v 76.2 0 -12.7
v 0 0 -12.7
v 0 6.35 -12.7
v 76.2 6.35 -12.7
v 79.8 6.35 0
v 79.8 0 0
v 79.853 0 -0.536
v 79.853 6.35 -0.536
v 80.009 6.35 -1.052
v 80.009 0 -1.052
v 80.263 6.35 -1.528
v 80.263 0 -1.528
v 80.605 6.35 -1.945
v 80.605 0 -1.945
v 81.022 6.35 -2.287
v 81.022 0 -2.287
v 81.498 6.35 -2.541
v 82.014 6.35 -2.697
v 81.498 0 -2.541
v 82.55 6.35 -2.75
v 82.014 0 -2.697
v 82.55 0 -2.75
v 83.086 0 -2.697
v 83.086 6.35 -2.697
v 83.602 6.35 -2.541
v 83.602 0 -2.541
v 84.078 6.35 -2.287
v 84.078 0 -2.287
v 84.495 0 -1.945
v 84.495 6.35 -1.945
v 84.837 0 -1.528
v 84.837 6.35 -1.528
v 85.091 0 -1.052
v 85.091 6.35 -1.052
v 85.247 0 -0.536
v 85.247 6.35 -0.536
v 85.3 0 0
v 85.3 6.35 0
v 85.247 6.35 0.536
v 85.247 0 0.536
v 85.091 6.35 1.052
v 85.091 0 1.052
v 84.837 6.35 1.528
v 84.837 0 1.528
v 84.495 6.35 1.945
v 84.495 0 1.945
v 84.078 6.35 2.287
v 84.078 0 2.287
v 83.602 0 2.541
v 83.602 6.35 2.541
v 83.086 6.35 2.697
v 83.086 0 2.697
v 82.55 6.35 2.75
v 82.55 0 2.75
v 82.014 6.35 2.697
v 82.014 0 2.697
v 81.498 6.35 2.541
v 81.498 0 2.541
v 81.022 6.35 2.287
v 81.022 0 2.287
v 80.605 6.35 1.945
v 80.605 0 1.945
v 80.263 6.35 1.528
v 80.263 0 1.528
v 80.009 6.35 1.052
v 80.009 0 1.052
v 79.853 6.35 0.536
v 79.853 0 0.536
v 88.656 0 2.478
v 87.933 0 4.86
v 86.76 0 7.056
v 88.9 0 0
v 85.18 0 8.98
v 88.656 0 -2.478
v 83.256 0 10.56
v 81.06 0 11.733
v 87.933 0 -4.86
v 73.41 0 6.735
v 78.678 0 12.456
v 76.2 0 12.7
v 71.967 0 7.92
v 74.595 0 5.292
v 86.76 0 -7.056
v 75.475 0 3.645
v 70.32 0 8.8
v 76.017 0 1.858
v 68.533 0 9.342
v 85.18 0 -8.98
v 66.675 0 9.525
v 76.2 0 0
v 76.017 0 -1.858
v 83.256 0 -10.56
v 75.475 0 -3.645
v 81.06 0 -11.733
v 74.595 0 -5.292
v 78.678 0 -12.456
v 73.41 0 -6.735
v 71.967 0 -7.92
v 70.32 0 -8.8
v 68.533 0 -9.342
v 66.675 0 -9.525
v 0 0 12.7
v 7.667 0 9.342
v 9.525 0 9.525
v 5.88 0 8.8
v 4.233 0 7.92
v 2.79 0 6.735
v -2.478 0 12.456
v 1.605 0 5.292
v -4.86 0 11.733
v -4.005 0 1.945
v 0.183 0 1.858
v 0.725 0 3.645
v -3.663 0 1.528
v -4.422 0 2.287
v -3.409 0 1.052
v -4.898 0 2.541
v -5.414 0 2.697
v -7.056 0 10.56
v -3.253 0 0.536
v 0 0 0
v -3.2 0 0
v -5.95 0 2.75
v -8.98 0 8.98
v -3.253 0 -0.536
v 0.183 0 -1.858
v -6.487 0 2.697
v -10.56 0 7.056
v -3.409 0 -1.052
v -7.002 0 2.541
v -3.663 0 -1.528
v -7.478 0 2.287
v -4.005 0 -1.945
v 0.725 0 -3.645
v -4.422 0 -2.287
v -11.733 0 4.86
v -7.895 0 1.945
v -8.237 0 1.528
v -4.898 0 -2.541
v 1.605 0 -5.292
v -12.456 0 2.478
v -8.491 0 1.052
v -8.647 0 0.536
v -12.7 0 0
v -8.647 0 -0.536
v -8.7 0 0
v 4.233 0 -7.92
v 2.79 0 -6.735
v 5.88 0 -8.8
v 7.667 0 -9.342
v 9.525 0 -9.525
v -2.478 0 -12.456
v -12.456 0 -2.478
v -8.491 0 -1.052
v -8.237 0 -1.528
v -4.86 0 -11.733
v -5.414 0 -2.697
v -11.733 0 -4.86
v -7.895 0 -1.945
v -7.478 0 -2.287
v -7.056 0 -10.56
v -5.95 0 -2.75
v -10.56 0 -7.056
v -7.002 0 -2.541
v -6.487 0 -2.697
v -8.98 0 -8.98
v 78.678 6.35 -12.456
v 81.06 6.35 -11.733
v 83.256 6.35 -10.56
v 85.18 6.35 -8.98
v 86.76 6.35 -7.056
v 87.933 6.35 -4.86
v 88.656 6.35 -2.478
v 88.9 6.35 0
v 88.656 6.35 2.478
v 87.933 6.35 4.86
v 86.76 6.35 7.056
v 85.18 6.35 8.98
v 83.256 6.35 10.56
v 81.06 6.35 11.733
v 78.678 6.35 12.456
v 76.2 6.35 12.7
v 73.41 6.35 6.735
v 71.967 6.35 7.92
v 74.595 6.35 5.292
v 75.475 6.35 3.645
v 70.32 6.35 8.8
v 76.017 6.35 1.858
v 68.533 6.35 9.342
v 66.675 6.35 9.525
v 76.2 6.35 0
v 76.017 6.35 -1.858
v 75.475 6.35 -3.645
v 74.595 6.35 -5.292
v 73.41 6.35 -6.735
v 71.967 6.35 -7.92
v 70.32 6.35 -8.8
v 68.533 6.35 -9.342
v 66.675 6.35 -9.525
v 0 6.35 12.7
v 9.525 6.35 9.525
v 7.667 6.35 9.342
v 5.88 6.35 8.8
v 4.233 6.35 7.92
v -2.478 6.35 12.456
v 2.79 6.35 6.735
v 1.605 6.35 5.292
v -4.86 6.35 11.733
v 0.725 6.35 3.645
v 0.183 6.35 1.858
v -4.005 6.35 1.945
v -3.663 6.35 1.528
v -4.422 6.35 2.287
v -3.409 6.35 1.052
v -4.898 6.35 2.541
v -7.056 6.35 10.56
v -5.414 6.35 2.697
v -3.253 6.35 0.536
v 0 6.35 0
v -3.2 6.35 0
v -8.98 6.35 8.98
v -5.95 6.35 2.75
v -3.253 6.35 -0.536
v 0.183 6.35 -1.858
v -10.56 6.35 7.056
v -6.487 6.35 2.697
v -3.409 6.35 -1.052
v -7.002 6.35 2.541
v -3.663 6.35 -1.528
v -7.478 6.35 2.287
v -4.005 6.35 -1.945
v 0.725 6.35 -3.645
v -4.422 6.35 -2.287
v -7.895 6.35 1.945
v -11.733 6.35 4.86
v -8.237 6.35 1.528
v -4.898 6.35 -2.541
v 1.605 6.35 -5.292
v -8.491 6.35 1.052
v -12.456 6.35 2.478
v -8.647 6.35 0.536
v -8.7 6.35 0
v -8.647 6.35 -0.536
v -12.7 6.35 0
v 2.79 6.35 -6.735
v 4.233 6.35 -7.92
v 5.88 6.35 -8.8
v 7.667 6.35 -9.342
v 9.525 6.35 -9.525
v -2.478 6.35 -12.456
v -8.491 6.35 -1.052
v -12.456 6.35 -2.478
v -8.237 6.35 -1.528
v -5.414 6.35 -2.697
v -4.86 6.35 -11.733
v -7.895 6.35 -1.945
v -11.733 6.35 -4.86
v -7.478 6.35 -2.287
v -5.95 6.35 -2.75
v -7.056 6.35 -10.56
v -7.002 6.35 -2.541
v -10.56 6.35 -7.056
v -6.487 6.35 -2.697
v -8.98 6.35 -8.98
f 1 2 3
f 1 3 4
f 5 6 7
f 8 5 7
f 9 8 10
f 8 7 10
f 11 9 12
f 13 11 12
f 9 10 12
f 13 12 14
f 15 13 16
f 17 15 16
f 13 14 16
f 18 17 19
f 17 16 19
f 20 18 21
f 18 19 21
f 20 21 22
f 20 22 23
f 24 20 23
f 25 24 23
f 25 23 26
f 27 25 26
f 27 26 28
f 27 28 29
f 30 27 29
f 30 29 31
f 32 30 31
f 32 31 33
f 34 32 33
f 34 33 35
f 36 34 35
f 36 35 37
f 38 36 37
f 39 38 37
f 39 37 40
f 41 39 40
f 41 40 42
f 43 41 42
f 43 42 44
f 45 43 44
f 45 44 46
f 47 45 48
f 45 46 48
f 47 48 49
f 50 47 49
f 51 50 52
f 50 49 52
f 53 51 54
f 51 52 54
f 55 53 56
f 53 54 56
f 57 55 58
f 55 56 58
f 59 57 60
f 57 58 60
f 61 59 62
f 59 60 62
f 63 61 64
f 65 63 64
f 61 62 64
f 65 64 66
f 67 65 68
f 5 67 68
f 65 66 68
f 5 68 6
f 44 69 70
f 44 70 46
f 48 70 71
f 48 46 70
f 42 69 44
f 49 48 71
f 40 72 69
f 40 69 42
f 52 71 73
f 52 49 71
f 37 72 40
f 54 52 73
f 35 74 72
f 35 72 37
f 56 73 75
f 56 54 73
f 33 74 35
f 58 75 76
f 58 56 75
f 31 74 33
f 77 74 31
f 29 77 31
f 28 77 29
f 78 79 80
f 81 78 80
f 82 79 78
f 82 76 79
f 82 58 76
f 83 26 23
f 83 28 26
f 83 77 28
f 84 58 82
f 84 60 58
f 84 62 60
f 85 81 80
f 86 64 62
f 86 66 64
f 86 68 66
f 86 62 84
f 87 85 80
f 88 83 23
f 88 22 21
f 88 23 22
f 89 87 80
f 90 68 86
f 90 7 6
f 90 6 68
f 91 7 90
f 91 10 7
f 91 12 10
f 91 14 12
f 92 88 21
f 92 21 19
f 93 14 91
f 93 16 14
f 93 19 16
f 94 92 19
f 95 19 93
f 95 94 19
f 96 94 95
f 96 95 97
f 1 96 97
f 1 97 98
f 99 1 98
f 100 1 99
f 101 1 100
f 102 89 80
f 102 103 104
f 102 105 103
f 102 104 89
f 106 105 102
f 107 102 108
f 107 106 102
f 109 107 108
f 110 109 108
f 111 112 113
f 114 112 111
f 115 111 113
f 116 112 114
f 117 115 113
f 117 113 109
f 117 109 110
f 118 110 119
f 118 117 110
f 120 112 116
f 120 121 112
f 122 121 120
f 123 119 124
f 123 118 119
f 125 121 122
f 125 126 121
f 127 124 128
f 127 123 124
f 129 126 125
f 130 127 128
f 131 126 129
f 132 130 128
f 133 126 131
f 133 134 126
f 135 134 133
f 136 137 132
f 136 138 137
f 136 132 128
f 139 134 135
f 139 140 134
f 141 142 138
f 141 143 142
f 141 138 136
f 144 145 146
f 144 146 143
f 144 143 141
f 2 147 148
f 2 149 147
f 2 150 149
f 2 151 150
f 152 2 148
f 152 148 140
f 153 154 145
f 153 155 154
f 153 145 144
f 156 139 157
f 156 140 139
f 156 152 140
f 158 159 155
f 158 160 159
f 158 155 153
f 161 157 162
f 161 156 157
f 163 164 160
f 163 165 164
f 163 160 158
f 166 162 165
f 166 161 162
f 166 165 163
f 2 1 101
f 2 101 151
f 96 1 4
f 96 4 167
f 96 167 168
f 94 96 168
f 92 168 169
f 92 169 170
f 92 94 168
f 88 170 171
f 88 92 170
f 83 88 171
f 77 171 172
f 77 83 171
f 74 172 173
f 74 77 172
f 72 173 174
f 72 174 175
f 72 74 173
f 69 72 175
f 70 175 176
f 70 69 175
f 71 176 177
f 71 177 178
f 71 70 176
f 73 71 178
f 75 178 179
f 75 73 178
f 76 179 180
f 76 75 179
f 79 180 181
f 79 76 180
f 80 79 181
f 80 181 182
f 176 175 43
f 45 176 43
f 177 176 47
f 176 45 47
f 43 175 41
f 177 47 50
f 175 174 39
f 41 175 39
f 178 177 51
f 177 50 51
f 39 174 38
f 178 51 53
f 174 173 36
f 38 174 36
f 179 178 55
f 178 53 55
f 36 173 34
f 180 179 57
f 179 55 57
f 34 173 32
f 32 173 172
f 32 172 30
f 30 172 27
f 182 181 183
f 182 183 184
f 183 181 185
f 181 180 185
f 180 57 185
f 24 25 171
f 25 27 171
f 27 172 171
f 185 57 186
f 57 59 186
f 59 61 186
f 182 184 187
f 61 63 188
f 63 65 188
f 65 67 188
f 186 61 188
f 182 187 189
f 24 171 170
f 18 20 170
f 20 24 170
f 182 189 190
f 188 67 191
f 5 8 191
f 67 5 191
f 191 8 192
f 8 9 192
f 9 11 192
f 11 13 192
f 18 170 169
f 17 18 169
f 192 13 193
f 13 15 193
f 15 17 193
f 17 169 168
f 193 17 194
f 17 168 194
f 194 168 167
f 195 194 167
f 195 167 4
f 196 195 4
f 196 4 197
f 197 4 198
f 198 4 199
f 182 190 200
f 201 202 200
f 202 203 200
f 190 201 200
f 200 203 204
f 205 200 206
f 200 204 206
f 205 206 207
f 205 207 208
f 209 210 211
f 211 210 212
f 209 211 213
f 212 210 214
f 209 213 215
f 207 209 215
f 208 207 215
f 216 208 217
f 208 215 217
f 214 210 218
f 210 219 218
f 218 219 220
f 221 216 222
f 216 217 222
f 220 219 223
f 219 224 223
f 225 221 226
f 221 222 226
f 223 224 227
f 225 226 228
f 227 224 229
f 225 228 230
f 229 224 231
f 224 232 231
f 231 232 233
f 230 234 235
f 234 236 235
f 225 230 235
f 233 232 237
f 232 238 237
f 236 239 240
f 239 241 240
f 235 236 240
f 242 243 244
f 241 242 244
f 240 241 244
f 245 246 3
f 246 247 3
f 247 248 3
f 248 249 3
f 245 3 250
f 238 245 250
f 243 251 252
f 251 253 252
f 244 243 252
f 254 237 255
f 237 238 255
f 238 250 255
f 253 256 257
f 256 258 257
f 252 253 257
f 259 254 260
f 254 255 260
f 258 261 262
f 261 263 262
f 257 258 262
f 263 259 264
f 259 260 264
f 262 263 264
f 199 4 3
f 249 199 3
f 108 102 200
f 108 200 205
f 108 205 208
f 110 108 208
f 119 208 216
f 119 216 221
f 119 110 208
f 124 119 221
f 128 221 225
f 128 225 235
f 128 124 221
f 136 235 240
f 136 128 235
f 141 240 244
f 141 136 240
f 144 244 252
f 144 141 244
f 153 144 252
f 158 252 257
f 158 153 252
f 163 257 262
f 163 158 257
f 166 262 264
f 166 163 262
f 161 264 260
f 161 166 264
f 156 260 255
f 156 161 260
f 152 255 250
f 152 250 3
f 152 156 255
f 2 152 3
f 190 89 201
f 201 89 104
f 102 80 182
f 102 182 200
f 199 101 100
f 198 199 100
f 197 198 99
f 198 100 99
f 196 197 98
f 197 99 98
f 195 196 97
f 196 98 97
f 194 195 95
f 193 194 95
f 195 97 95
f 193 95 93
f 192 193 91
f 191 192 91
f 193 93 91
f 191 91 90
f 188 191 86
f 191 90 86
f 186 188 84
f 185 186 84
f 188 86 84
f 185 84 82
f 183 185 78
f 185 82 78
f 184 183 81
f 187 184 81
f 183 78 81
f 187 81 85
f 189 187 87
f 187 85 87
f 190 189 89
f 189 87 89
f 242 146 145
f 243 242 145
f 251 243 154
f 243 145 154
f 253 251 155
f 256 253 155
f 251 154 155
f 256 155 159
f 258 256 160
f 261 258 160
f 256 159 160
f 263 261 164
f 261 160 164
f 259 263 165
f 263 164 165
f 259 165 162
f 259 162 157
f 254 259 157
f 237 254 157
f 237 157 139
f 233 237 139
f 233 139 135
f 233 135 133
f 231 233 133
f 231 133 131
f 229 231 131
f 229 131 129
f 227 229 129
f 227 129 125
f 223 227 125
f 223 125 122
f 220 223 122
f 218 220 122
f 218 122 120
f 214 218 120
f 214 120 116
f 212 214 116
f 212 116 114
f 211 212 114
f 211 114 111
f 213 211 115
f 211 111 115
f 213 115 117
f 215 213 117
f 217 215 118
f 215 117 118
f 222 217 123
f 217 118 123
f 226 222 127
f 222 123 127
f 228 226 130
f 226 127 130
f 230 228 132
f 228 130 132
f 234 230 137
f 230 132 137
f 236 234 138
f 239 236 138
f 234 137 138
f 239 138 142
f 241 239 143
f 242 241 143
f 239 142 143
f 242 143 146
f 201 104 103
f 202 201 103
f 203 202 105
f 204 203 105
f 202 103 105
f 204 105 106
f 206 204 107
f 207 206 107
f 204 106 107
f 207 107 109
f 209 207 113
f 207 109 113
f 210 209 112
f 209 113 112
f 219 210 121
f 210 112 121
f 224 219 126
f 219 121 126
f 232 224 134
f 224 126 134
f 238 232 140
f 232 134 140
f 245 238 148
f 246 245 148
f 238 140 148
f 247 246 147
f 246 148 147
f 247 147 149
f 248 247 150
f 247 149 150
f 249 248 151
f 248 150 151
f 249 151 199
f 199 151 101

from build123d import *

# Parameters (mm, degrees)
BOSS_EXTRUDE1_DEPTH  = 6.35
M5_CLEARANCE_HOLE1_D = 5.5


with BuildPart() as part:
    # Sketch2 → Boss-Extrude1 (new body)
    with BuildSketch(Plane(origin=(0, 0, 0), x_dir=(1, 0, 0), z_dir=(0, 1, 0))):
        with BuildLine():
            Line((0, 12.7), (76.2, 12.7))
            ThreePointArc((76.2, 12.7), (88.9, 0), (76.2, -12.7))
            Line((76.2, -12.7), (0, -12.7))
            ThreePointArc((0, -12.7), (-12.7, 0), (0, 12.7))
        make_face()
        with BuildLine():
            Line((9.525, 9.525), (66.675, 9.525))
            ThreePointArc((66.675, 9.525), (76.2, 0), (66.675, -9.525))
            Line((66.675, -9.525), (9.525, -9.525))
            ThreePointArc((9.525, -9.525), (0, 0), (9.525, 9.525))
        make_face(mode=Mode.SUBTRACT)
    extrude(amount=BOSS_EXTRUDE1_DEPTH)

    # M5 Clearance Hole1 (through all)
    with Locations(Plane(origin=(0, 6.35, 0), x_dir=(1, 0, 0), z_dir=(0, 1, 0))):
        with Locations((-5.950002807, 0), (82.55, 0)):
            Hole(M5_CLEARANCE_HOLE1_D / 2)


solid = part.part
